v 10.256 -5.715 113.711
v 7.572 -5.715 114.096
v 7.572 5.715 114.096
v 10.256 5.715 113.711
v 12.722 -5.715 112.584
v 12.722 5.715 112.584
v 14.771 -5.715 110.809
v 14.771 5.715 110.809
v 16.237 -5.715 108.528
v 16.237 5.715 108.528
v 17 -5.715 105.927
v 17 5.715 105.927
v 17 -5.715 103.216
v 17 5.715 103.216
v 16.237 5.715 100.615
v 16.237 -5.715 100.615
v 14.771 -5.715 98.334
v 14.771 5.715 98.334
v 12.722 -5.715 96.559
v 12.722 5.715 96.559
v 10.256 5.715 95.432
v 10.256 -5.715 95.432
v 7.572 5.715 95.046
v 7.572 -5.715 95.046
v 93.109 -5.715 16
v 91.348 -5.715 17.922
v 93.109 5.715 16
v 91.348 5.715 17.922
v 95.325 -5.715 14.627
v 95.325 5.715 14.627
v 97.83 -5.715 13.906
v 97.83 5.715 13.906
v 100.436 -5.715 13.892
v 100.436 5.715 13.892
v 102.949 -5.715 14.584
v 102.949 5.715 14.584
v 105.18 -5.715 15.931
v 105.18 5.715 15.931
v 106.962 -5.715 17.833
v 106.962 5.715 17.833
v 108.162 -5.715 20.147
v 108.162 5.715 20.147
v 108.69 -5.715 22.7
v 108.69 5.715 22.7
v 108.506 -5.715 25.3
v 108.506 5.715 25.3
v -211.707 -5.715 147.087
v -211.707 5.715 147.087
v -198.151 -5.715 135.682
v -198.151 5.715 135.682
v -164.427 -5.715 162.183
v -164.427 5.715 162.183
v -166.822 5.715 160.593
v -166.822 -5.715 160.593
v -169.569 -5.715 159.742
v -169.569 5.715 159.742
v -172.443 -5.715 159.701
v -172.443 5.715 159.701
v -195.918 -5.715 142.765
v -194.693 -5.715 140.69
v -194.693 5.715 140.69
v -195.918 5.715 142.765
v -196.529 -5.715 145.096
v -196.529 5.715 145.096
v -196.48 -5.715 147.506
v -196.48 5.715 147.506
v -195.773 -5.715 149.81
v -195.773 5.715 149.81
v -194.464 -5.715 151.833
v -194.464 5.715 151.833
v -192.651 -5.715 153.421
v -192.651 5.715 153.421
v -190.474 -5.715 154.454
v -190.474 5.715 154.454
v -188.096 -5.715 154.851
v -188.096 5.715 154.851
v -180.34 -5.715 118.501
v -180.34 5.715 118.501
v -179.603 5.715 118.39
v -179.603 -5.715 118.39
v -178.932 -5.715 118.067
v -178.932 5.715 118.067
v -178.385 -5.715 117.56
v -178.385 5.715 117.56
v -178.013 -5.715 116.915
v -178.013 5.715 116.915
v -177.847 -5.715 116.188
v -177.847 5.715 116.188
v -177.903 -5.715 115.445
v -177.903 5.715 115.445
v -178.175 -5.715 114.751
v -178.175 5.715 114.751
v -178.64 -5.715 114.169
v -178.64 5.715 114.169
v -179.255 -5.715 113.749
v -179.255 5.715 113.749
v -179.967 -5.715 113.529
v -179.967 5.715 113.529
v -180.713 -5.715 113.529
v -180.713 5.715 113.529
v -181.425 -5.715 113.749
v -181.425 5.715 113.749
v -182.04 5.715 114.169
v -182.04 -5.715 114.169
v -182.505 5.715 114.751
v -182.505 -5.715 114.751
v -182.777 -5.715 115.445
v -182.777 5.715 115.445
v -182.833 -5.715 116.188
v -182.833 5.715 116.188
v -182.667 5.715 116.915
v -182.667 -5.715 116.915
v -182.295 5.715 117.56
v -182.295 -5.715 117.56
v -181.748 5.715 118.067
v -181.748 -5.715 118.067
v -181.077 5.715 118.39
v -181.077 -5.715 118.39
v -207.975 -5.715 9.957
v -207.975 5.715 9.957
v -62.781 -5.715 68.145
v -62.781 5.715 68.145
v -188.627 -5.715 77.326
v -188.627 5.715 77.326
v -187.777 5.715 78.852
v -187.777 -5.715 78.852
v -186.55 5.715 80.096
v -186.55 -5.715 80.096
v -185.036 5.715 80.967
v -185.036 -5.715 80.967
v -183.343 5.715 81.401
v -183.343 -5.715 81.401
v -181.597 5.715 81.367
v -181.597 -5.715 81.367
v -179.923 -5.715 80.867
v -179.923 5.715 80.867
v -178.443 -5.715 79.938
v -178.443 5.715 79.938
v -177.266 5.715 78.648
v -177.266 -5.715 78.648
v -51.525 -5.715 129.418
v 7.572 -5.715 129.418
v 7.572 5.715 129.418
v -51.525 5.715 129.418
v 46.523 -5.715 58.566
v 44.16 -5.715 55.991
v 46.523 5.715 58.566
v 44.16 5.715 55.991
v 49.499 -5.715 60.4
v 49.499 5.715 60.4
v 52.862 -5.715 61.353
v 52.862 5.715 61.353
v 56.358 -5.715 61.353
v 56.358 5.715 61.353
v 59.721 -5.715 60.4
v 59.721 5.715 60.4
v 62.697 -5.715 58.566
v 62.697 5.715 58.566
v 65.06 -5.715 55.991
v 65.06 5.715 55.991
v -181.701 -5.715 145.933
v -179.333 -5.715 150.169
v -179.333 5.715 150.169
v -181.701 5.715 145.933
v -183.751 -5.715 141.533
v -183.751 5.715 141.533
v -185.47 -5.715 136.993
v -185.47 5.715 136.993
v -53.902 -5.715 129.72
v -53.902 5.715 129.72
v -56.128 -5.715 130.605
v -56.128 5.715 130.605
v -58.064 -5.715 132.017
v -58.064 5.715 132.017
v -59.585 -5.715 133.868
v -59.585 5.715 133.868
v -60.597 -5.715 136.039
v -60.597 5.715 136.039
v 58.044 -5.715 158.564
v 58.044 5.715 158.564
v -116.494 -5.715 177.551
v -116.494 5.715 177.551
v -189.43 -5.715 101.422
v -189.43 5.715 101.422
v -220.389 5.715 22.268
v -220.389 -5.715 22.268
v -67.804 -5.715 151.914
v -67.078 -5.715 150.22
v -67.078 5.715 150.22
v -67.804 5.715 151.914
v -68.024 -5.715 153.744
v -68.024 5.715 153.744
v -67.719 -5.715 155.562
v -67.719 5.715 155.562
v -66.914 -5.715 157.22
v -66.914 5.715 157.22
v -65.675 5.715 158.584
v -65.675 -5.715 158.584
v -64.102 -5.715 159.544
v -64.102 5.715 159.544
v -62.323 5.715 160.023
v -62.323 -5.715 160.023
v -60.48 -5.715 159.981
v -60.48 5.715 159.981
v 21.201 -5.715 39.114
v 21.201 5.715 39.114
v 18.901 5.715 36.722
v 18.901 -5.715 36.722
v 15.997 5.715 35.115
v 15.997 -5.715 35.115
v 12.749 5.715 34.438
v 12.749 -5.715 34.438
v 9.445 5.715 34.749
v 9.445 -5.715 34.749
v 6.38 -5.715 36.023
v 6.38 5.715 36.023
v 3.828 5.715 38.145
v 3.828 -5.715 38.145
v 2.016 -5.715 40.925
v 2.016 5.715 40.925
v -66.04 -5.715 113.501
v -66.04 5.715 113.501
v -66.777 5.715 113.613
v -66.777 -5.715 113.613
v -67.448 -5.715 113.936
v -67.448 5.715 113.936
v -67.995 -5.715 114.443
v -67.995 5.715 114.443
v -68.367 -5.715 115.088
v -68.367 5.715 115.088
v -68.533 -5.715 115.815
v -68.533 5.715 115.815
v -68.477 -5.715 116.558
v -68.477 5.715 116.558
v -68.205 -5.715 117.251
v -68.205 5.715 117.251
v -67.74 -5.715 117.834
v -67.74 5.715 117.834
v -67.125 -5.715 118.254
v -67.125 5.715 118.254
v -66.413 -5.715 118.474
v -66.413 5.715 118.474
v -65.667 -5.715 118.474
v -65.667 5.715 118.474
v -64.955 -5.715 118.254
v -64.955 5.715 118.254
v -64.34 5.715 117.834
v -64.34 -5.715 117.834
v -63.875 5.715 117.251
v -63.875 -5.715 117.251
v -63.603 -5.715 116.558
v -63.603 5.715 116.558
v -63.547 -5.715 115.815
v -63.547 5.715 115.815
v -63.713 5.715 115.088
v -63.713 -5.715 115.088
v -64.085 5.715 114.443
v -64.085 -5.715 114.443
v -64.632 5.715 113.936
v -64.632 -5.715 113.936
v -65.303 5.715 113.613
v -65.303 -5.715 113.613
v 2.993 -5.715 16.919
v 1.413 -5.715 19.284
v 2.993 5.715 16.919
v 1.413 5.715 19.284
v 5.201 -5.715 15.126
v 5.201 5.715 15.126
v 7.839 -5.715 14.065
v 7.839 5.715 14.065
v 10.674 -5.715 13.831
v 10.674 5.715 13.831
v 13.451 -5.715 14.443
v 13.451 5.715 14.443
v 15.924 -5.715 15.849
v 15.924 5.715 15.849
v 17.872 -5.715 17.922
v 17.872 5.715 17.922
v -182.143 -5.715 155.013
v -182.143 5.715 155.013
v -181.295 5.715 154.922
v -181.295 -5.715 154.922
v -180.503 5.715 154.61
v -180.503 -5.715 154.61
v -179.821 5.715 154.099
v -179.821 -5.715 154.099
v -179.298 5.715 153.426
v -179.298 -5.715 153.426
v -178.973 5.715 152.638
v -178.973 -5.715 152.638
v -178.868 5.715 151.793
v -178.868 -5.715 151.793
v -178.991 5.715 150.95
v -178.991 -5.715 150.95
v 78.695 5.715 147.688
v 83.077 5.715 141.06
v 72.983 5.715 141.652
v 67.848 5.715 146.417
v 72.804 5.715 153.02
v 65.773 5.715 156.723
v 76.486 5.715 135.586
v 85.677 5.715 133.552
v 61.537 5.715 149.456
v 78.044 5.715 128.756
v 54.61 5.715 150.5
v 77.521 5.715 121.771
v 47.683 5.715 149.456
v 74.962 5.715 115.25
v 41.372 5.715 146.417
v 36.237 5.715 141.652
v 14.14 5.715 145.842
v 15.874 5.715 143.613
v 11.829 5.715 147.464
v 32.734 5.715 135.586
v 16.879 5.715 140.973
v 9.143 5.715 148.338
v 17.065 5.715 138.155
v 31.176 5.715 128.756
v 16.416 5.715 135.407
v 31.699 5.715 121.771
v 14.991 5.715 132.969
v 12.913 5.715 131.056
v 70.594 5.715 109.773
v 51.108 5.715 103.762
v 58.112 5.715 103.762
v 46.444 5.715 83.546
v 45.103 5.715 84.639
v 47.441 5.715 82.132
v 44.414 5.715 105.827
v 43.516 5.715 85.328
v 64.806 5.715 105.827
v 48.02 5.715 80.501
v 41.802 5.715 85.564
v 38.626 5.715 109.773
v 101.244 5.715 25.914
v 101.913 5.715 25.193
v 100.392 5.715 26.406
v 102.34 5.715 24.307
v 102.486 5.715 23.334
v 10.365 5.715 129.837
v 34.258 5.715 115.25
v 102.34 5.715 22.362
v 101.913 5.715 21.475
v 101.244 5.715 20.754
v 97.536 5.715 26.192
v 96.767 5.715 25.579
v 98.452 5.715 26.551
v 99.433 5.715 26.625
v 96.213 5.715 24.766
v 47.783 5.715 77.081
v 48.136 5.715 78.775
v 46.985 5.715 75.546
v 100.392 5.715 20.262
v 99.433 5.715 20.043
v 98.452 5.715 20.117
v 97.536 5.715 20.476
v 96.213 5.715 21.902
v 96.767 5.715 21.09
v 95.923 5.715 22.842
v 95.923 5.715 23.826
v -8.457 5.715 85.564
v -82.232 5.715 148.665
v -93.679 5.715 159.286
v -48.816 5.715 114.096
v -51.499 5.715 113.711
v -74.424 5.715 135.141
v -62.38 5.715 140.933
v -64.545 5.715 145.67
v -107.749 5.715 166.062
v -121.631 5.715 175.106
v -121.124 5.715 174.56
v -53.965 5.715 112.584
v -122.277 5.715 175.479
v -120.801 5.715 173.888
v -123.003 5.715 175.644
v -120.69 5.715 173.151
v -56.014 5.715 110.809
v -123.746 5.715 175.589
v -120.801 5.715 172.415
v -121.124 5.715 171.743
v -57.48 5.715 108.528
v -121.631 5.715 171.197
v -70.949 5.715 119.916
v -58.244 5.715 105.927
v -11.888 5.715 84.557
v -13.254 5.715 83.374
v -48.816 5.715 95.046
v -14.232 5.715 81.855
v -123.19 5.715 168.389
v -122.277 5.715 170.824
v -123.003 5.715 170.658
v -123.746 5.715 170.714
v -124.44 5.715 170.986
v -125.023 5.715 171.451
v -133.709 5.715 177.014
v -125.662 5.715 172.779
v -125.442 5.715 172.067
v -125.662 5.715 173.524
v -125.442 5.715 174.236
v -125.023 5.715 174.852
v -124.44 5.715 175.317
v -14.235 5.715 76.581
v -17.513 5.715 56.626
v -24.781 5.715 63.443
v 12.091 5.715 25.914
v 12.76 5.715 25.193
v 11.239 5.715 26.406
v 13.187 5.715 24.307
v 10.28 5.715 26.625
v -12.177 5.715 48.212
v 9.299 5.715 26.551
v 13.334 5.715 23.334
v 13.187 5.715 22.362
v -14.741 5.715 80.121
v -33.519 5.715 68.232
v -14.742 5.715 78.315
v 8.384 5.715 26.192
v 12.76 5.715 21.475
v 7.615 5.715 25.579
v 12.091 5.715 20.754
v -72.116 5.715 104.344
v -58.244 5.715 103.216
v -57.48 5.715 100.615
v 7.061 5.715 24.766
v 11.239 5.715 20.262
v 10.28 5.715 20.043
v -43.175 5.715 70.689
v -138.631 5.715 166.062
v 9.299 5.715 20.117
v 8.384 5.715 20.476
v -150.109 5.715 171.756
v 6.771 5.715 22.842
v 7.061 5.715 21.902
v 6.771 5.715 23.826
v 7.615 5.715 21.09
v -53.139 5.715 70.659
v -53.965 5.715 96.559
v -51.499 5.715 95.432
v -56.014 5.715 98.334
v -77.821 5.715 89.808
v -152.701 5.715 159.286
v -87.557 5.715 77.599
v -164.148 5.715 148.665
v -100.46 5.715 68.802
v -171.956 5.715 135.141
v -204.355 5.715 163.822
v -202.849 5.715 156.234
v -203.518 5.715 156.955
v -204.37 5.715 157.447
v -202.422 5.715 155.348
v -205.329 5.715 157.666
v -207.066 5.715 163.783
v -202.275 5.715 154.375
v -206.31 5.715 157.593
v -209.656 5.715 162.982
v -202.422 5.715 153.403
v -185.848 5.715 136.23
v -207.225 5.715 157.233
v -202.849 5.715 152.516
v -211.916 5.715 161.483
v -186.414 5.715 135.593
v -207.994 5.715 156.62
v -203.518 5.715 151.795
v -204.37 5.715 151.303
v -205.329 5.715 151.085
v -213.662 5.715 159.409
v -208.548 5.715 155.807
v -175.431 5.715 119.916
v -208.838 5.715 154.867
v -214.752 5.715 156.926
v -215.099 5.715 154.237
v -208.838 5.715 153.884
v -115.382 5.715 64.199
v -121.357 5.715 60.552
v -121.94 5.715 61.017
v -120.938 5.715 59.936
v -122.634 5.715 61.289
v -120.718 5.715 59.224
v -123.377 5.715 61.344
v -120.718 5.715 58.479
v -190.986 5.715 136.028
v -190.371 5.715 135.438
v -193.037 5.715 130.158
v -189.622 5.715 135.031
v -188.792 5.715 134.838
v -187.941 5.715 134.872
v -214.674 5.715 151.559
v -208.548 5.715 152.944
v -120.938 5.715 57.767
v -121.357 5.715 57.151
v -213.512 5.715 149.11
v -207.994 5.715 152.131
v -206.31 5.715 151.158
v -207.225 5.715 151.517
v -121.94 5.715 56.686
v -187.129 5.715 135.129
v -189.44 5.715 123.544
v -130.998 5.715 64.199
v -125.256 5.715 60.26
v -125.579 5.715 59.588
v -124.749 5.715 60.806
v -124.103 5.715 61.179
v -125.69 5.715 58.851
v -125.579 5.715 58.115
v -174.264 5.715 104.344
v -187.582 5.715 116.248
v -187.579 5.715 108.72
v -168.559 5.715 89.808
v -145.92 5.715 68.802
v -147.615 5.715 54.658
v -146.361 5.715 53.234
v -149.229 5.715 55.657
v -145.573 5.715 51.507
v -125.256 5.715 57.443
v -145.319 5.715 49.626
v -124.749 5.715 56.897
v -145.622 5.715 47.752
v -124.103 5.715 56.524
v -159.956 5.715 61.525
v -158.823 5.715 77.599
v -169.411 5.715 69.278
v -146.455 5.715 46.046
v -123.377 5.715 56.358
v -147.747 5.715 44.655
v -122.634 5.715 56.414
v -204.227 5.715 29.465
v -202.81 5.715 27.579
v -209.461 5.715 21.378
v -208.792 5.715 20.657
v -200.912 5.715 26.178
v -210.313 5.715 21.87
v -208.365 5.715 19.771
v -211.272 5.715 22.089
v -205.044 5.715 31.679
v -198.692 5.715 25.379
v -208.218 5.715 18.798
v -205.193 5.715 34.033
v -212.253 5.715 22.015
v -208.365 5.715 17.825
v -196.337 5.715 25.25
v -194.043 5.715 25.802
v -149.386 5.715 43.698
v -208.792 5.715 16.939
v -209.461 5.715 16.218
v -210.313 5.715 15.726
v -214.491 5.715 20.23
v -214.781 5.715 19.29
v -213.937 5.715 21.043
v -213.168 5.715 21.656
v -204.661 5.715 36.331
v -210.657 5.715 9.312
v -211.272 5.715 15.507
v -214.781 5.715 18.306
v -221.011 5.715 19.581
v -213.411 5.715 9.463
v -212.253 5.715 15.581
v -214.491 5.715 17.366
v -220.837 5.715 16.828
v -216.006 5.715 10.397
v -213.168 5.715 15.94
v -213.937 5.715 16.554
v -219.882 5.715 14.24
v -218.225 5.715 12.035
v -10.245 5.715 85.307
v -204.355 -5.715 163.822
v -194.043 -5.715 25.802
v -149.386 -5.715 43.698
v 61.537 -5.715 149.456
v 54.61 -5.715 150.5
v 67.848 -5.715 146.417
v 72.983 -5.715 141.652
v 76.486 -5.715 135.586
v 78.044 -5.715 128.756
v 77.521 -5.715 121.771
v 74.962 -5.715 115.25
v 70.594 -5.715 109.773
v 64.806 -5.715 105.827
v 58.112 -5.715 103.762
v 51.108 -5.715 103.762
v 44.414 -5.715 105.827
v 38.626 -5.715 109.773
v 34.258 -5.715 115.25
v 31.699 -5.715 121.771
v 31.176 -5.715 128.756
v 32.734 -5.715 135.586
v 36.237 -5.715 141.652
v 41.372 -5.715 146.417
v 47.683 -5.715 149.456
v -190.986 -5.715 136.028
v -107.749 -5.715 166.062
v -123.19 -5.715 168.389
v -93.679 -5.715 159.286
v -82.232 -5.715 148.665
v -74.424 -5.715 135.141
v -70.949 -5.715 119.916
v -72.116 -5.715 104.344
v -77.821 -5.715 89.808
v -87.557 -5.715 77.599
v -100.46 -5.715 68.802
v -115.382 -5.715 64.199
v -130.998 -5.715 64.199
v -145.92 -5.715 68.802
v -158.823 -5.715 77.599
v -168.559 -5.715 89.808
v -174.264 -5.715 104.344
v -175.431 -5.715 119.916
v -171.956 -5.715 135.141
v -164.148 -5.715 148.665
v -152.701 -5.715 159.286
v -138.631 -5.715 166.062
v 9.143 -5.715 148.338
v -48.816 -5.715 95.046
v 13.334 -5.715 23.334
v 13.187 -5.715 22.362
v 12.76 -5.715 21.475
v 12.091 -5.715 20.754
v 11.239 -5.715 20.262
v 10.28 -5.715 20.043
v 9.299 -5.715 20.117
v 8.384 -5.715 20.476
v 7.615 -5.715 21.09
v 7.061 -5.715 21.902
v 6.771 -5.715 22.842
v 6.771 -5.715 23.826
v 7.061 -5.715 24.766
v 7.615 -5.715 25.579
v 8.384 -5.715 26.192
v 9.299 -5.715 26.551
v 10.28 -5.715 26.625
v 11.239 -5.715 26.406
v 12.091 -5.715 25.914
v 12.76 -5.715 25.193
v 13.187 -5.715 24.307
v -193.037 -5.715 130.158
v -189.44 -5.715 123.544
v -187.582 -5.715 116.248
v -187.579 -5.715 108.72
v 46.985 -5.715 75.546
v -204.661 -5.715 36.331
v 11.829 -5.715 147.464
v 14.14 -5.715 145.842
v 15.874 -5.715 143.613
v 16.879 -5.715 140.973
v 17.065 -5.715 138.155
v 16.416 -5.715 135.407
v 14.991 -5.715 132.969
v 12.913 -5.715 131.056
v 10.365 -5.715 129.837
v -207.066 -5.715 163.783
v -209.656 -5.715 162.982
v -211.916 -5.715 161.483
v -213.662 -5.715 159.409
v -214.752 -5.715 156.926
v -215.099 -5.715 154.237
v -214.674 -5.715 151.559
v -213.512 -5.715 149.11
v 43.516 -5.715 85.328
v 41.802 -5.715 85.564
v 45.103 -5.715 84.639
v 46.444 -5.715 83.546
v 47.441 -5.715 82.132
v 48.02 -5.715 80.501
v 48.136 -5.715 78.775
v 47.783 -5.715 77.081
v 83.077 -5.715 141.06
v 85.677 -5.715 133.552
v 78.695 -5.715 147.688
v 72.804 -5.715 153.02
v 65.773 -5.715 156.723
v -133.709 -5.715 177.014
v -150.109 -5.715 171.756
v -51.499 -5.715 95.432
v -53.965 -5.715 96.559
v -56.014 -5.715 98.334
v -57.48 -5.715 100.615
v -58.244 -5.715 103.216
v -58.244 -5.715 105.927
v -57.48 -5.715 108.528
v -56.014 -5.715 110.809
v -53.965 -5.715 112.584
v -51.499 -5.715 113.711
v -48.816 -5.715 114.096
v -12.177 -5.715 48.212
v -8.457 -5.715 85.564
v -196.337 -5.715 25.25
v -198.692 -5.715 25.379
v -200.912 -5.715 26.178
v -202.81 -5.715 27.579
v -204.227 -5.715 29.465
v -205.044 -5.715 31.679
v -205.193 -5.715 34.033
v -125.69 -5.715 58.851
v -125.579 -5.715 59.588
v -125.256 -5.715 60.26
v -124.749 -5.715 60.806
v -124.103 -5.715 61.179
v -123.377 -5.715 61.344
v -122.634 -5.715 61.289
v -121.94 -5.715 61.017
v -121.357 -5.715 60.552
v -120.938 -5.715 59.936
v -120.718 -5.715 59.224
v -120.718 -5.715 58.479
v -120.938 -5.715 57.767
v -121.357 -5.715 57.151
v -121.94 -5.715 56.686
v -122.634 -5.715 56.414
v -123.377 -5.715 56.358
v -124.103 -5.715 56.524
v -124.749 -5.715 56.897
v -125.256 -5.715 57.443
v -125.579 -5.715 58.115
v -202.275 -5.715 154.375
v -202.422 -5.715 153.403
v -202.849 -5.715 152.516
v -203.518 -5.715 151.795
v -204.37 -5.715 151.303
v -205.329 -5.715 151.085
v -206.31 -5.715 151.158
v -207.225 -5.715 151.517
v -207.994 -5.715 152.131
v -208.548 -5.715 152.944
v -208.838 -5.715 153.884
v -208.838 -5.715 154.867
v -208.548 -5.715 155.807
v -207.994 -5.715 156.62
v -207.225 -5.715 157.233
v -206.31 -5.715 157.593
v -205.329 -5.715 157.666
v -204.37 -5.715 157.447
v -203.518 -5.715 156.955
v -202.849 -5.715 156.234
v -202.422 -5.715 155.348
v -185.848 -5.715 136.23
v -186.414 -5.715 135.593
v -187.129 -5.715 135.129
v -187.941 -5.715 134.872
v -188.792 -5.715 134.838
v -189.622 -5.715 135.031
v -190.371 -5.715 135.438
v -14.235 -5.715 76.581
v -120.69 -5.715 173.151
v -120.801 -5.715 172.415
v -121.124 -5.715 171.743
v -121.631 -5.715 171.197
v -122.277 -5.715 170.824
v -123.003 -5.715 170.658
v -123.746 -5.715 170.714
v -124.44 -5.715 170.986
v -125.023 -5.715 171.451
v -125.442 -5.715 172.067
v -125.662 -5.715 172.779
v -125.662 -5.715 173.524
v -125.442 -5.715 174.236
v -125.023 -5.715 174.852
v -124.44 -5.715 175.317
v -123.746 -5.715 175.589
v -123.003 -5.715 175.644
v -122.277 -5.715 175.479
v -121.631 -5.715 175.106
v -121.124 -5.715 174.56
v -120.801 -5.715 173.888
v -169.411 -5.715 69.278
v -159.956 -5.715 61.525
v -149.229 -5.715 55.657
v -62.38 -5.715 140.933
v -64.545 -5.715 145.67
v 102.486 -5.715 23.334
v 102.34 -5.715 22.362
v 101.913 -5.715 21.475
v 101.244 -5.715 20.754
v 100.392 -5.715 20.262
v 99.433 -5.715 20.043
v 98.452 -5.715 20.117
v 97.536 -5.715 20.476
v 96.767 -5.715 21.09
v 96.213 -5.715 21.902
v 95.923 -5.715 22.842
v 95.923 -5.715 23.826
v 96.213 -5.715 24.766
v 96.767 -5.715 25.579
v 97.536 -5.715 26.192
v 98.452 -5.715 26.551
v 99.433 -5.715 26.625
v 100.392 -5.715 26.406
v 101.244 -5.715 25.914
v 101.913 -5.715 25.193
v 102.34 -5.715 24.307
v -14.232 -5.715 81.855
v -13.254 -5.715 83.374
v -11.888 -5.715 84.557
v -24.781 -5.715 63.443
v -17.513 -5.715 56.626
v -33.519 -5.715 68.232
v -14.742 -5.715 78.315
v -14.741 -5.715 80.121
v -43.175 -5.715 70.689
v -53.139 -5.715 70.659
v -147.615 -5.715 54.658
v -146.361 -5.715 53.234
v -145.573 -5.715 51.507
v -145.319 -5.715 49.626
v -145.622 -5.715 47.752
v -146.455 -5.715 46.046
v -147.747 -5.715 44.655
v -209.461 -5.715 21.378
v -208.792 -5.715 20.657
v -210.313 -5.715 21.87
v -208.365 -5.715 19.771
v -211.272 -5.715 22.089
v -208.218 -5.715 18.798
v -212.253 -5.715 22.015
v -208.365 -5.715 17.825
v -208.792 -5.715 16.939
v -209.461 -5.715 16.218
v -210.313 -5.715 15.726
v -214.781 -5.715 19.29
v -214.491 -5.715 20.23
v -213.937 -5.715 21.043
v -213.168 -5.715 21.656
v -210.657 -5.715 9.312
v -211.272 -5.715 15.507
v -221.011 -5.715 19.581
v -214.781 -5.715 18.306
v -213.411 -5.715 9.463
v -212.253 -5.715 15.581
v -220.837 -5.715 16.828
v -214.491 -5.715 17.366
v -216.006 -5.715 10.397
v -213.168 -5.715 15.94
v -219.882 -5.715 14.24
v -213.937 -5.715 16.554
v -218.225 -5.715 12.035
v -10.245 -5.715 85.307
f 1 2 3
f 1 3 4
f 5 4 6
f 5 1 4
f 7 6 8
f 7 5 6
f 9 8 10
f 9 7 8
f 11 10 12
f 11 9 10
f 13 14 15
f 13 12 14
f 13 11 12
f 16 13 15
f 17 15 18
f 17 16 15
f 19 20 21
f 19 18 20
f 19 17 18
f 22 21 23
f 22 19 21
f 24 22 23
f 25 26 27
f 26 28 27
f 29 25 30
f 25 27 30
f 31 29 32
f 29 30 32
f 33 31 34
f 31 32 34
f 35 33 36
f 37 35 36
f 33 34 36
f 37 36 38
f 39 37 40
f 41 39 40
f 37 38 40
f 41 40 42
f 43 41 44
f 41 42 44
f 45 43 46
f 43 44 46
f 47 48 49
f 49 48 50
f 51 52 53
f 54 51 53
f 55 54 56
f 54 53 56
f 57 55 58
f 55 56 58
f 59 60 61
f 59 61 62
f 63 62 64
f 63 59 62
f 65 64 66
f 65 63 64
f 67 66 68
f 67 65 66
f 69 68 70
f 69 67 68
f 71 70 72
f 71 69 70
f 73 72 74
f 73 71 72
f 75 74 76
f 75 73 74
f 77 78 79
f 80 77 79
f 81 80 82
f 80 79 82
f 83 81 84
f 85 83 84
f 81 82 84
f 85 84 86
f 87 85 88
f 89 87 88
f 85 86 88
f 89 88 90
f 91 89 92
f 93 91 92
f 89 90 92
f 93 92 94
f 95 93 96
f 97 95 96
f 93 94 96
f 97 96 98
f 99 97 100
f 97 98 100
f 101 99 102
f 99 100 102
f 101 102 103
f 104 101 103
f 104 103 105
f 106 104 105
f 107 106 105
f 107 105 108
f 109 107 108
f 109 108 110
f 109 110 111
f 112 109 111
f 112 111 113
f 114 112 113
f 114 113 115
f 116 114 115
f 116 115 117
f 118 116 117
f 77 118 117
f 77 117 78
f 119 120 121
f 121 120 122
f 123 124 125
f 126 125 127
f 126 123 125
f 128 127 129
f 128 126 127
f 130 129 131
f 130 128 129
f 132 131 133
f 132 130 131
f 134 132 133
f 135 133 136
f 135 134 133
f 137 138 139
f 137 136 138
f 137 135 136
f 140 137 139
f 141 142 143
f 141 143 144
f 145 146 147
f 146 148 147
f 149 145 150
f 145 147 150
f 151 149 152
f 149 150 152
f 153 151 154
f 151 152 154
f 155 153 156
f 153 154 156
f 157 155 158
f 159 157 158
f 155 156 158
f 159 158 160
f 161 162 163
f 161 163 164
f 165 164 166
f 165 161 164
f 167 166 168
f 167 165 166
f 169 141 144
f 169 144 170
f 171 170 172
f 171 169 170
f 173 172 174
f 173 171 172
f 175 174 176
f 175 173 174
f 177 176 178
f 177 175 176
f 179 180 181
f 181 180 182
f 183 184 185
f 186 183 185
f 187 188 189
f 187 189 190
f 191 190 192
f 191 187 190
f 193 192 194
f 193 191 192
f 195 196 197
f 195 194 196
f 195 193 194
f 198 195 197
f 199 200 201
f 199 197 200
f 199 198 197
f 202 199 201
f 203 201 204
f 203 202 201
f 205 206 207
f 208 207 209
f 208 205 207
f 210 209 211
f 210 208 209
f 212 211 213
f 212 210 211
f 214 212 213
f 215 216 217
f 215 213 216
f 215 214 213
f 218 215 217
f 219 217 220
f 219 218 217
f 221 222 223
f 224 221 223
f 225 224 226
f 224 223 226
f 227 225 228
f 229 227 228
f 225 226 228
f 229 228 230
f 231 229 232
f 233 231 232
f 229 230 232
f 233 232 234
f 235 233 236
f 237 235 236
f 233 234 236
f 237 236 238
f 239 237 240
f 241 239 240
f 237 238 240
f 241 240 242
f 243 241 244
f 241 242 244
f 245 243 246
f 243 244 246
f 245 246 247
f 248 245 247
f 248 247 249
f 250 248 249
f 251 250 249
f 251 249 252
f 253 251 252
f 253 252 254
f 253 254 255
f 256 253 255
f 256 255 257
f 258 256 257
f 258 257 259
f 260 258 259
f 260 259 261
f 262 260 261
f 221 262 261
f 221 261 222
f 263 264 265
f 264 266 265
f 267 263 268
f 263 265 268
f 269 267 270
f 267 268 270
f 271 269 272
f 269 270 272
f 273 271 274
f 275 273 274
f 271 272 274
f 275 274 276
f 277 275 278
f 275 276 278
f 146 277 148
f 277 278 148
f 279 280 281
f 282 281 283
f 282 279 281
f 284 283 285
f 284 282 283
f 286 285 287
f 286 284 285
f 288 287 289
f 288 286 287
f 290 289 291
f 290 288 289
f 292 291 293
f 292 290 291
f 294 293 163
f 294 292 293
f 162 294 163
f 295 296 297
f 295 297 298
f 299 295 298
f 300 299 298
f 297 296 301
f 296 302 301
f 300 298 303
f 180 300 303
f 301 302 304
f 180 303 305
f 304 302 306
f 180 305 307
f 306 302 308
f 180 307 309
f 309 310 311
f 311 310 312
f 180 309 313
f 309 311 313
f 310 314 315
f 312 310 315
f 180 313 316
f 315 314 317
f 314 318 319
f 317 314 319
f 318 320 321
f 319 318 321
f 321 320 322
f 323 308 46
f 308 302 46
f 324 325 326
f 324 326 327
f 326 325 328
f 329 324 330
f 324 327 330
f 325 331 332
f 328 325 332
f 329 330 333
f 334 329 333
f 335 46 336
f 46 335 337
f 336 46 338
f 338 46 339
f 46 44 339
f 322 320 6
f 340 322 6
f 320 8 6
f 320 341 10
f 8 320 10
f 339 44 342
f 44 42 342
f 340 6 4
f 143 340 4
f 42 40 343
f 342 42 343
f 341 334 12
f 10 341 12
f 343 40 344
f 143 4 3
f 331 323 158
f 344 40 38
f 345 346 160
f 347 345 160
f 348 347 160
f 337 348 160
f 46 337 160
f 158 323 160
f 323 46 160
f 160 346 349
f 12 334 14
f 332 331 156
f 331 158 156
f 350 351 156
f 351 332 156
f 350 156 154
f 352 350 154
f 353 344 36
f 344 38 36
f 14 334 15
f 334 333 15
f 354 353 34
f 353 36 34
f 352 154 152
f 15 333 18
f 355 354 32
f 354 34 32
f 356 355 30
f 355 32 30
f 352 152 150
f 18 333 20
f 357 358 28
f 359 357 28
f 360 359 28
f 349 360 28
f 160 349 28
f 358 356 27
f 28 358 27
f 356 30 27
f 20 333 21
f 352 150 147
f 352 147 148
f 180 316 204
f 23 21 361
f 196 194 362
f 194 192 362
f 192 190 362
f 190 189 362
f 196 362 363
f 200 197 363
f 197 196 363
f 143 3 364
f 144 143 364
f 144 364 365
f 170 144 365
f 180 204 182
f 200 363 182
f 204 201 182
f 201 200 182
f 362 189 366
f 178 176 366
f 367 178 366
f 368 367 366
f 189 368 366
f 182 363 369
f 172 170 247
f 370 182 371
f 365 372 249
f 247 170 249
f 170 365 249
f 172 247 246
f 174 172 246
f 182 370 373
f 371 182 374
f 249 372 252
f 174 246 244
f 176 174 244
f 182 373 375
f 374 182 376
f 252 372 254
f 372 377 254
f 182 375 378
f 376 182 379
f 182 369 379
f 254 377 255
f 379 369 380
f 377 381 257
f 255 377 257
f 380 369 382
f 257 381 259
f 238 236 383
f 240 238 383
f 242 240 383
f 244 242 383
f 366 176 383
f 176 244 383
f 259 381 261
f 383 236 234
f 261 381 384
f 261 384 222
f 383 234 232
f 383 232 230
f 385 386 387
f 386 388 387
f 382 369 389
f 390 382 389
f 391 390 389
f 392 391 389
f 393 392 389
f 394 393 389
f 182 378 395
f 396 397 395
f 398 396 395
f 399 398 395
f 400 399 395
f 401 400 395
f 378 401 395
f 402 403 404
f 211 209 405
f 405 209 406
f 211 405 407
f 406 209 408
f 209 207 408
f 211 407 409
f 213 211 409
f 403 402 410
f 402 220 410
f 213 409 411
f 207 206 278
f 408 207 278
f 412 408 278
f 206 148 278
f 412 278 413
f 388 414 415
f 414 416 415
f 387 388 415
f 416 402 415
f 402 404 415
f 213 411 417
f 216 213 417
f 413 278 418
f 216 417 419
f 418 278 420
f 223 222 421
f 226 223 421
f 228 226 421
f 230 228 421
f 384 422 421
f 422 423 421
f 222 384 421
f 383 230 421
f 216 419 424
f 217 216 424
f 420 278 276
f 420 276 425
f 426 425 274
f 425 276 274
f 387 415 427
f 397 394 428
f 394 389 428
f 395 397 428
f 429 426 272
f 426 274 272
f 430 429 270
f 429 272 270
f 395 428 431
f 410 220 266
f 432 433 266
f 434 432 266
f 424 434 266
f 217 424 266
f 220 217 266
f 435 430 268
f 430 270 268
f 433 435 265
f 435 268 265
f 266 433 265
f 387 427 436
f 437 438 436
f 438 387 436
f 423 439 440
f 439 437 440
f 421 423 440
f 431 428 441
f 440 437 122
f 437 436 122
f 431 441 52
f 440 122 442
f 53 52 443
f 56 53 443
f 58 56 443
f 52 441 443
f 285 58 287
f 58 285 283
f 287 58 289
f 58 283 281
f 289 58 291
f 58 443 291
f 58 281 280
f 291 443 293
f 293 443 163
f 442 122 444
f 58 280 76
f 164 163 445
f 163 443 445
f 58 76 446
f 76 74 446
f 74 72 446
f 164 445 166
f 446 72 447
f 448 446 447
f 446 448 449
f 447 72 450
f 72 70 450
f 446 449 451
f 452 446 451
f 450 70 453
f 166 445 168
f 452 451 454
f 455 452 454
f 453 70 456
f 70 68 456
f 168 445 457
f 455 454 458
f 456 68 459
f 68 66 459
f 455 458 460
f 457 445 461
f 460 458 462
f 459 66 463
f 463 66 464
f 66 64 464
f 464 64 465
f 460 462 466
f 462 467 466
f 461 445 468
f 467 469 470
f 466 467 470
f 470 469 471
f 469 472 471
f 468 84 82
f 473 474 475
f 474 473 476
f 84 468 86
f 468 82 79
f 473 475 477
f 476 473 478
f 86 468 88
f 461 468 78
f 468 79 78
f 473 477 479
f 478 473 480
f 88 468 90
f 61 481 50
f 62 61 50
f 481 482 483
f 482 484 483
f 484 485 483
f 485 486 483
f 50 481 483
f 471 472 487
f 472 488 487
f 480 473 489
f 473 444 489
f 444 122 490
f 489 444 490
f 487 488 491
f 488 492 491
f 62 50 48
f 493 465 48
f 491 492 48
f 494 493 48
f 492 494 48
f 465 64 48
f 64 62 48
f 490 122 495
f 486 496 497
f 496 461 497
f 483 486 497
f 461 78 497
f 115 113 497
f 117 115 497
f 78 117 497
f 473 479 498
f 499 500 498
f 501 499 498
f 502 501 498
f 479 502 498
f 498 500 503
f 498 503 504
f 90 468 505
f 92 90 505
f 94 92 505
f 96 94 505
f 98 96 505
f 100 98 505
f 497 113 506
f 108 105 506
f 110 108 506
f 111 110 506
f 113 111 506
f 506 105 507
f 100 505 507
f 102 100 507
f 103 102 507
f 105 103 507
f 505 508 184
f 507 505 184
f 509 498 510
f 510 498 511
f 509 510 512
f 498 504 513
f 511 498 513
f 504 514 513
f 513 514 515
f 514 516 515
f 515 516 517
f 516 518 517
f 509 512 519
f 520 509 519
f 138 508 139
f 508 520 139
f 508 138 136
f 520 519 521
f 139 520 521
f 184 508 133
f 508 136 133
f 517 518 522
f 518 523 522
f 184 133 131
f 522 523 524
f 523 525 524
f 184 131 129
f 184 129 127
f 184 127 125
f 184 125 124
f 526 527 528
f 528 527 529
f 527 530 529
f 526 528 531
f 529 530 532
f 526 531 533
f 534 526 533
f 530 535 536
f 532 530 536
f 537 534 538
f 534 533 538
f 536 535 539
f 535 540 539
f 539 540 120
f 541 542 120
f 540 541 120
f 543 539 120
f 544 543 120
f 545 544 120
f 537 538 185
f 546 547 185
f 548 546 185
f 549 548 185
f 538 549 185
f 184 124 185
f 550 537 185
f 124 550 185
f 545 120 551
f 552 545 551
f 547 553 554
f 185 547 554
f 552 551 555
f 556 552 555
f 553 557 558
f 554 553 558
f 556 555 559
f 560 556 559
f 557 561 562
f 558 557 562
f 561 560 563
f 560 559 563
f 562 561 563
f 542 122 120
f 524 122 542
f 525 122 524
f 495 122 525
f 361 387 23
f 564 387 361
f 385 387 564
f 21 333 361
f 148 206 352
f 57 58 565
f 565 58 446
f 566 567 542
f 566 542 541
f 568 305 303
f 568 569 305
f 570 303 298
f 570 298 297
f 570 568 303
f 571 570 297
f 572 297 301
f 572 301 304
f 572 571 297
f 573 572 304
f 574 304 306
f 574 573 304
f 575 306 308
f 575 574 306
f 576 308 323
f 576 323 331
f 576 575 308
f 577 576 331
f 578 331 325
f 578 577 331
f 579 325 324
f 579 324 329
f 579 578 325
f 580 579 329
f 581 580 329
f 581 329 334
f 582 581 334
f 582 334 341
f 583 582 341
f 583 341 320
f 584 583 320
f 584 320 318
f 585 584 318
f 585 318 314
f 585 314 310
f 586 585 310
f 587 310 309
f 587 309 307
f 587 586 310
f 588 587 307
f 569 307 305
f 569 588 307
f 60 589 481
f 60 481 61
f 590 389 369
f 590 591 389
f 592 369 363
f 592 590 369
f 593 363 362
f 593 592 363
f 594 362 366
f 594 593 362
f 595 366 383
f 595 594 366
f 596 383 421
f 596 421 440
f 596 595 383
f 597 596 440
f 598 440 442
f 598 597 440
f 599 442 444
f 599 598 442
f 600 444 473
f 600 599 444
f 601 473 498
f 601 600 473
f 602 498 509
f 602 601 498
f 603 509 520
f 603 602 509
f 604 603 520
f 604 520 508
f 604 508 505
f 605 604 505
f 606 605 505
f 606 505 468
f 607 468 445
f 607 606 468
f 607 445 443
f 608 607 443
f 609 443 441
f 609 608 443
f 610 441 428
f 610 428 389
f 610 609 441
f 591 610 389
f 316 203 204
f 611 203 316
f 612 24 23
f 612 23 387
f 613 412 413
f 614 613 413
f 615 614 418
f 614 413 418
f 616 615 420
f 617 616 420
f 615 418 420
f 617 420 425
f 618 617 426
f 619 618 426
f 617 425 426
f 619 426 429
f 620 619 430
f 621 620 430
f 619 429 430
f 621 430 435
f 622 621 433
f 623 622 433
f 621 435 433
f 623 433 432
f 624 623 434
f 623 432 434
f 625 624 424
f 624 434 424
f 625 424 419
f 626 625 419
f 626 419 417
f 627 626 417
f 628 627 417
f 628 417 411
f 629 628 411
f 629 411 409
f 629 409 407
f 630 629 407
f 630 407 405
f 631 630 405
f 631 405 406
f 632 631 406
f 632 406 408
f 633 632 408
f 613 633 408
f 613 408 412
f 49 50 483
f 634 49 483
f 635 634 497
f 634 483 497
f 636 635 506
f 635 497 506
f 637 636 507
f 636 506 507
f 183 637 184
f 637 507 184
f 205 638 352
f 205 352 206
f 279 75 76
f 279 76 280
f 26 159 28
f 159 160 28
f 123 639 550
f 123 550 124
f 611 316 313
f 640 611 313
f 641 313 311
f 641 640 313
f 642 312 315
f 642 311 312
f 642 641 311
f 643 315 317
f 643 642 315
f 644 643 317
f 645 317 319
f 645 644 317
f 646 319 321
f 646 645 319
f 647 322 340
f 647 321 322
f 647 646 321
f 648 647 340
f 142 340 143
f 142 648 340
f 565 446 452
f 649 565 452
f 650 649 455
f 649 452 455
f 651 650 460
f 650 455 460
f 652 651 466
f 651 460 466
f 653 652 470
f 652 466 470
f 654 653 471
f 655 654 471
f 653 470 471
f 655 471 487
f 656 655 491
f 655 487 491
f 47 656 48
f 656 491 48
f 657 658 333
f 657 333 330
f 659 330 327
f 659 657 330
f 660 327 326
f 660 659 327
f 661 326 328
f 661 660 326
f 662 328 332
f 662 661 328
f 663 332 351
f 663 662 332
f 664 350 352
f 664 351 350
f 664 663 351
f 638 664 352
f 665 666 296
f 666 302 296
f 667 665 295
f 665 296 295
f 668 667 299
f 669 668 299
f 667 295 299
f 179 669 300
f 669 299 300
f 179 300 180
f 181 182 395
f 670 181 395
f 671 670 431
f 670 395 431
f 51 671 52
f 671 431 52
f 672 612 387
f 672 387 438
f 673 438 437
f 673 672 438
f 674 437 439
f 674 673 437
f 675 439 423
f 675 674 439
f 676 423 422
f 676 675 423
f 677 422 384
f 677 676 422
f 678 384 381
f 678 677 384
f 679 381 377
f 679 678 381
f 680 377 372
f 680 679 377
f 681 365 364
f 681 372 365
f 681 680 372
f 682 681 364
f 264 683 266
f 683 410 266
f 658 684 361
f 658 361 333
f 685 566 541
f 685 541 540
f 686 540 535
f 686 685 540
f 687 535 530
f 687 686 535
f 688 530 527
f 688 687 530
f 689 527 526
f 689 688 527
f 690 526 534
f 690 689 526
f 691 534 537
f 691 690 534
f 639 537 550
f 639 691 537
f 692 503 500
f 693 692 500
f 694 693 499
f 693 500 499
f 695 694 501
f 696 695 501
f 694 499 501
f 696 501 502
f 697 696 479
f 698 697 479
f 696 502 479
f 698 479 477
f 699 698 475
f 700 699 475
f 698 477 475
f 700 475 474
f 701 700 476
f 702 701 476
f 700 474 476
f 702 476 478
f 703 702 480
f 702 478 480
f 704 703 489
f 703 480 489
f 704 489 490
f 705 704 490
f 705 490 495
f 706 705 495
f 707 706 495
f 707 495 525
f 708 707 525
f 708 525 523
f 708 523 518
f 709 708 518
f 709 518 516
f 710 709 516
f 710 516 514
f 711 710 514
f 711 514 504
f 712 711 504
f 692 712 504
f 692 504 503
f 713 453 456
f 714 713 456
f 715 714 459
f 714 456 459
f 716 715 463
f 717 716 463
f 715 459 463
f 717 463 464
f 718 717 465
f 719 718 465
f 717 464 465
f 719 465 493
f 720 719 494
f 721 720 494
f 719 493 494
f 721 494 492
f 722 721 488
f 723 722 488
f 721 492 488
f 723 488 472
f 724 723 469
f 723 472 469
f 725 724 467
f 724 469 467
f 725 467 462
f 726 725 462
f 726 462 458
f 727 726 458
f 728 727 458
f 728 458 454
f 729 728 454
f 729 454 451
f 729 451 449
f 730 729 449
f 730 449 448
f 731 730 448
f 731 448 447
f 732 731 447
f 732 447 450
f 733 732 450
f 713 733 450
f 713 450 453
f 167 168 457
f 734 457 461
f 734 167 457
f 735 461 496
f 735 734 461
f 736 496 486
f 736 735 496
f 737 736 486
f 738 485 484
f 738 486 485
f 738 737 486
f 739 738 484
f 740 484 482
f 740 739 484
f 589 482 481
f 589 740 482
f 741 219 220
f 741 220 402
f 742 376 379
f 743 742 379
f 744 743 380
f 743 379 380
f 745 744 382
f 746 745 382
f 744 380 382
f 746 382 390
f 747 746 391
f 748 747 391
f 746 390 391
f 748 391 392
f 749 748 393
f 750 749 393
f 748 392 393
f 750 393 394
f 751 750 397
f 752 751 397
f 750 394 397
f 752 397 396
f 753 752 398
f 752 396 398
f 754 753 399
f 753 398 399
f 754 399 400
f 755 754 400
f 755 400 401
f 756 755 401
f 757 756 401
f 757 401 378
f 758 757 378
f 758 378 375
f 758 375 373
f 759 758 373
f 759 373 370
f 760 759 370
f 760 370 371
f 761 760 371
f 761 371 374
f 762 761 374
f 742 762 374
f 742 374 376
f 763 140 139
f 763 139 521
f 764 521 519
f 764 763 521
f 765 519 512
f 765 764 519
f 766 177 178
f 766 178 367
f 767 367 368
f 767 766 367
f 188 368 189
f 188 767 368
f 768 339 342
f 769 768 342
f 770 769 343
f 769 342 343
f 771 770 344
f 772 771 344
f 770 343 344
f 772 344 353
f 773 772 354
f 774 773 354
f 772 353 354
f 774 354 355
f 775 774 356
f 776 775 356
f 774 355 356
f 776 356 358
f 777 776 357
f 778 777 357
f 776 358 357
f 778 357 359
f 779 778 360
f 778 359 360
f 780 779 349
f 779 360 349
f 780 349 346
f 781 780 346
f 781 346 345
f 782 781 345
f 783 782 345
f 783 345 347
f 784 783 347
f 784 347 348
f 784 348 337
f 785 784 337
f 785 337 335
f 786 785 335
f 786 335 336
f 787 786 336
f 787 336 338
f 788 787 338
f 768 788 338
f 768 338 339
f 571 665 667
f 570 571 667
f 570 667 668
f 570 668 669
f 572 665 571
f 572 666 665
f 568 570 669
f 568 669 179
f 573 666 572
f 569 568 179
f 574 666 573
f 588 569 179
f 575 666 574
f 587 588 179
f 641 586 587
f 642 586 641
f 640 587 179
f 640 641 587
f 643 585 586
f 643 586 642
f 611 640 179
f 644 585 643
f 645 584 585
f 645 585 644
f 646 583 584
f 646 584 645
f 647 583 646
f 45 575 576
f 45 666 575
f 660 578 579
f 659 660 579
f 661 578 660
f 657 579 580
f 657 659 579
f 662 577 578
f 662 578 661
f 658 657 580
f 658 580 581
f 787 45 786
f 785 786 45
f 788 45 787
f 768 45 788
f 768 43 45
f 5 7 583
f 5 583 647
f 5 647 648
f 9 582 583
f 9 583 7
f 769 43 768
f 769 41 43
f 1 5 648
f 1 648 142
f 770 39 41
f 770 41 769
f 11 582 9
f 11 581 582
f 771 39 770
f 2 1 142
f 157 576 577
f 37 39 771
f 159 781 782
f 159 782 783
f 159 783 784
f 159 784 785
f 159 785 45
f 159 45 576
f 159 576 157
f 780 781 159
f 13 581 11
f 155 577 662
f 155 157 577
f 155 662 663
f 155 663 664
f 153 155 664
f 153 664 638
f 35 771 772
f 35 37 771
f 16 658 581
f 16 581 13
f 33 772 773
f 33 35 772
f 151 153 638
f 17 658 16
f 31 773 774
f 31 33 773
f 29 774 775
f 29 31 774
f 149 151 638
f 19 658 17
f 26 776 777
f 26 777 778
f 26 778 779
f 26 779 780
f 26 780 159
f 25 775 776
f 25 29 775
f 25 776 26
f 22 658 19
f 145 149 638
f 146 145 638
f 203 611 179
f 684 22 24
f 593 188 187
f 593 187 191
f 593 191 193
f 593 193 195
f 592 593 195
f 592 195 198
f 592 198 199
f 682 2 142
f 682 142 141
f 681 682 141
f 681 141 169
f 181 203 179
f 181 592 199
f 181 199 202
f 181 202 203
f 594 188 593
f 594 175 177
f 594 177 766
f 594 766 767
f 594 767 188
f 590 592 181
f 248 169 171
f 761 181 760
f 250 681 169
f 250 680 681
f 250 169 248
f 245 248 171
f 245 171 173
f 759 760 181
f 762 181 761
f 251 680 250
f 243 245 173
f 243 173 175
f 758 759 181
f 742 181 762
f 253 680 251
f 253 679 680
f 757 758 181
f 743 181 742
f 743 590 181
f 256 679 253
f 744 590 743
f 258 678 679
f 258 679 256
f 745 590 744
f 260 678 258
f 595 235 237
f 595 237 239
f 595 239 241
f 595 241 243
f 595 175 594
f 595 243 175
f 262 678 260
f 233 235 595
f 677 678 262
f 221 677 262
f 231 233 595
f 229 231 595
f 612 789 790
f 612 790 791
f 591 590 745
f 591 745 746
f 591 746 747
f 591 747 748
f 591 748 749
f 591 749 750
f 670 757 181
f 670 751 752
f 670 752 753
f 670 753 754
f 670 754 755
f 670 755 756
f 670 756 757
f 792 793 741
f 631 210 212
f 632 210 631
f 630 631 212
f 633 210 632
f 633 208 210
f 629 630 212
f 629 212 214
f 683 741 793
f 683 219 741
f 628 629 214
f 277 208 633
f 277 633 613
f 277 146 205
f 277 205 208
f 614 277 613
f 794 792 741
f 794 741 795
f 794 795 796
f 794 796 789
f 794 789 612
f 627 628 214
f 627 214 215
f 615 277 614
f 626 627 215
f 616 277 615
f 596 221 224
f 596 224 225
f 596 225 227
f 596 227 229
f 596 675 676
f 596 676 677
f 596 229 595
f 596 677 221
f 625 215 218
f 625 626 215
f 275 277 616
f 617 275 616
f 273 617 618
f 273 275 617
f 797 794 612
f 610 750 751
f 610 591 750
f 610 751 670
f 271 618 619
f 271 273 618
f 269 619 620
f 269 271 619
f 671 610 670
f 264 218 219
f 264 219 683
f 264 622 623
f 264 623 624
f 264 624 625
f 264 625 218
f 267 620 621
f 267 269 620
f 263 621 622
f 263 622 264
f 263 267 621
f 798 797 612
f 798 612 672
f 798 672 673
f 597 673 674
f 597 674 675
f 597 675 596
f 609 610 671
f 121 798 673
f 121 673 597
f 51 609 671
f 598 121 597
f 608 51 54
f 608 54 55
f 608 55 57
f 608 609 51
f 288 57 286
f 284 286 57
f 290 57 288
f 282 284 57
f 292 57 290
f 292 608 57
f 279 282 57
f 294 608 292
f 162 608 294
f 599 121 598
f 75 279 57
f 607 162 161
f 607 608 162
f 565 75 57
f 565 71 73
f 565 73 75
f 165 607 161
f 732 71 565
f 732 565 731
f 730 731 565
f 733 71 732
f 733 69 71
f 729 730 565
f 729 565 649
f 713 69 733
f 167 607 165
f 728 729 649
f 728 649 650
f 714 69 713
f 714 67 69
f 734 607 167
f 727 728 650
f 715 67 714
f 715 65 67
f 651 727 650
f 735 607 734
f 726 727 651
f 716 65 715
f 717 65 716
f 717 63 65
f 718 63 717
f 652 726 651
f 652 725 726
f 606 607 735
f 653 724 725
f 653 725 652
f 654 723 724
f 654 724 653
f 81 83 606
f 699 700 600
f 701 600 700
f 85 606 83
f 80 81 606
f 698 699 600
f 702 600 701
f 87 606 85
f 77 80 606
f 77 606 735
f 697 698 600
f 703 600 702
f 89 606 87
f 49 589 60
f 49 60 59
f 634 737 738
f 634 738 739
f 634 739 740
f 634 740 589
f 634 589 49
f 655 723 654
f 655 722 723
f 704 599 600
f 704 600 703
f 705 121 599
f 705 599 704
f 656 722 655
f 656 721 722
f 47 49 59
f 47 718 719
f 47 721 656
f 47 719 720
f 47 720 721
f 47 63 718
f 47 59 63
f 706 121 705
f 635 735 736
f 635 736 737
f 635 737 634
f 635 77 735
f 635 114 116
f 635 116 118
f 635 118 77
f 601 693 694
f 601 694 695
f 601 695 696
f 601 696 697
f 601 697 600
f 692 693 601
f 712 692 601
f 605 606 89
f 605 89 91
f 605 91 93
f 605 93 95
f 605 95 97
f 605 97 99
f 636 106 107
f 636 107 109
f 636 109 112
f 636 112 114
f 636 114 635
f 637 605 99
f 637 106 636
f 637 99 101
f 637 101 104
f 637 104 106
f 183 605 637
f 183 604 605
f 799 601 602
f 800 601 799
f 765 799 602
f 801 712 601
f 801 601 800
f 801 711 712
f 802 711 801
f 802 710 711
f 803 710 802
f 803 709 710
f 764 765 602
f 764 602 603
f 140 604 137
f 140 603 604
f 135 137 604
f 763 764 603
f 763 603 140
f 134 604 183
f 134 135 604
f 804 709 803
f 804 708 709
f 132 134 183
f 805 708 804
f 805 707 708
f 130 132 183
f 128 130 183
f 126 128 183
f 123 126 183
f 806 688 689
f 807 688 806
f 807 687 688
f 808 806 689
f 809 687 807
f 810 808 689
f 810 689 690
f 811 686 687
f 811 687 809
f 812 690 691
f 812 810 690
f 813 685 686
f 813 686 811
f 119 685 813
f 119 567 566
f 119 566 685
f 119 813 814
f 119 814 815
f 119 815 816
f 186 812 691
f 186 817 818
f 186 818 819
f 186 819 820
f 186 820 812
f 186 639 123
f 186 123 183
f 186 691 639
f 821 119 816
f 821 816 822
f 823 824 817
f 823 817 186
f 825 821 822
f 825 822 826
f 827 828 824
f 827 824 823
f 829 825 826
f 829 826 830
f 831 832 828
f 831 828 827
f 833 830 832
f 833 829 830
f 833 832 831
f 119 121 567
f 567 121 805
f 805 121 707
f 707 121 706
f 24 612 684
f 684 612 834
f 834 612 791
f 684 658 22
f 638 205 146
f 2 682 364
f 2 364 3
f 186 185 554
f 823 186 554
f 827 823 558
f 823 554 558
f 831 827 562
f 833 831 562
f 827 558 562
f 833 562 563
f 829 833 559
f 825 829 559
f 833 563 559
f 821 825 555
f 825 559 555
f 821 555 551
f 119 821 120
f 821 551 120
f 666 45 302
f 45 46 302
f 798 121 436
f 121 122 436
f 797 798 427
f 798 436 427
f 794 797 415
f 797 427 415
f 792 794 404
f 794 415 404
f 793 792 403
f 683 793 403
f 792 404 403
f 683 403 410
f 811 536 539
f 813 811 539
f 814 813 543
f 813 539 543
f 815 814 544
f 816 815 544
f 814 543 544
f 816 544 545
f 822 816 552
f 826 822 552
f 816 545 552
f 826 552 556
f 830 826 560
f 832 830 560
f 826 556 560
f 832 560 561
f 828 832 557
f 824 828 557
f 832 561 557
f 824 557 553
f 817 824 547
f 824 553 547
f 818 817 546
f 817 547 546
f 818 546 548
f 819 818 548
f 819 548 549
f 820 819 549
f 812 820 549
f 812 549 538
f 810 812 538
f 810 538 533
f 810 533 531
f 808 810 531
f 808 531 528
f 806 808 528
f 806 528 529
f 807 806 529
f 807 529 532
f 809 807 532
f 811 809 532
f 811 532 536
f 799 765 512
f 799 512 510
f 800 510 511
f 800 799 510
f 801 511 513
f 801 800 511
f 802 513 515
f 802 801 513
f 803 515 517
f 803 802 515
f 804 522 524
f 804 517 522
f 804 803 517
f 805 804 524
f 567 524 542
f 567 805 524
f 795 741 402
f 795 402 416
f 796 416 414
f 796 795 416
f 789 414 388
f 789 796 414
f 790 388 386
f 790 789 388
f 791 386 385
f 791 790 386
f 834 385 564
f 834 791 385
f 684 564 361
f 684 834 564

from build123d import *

# Parameters (mm, degrees)
SKETCH1_R             = 52.3875
SKETCH1_R_2           = 23.5
BOSS_EXTRUDE1_DEPTH   = 5.715
M6_CLEARANCE_HOLE1_D  = 6.6
F_5_0MM_DOWEL_HOLE1_D = 5
CIRPATTERN1_COUNT     = 4
CUT_EXTRUDE1_DEPTH    = 284.979078357
CUT_EXTRUDE2_DEPTH    = 284.979078357


with BuildPart() as part:
    # Sketch1 → Boss-Extrude1 (new, symmetric)
    with BuildSketch(Plane(origin=(0, 0, 0), x_dir=(1, 0, 0), z_dir=(0, 1, 0))):
        with BuildLine():
            Line((-207.974881785, -9.956762437), (-62.780706514, -68.14502812))
            ThreePointArc((-62.780706514, -68.14502812), (-33.518744337, -68.231765471), (-12.176603989, -48.212200061))
            Line((-12.176603989, -48.212200061), (1.412558245, -19.284326264))
            ThreePointArc((1.412558245, -19.284326264), (9.247910088, -13.841666007), (17.871565555, -17.92184438))
            Line((17.871565555, -17.92184438), (44.159519082, -55.990558325))
            ThreePointArc((44.159519082, -55.990558325), (54.61, -61.474087679), (65.060480918, -55.990558325))
            Line((65.060480918, -55.990558325), (91.348434445, -17.92184438))
            ThreePointArc((91.348434445, -17.92184438), (102.948934458, -14.583873353), (108.5062916, -25.299722957))
            Line((108.5062916, -25.299722957), (85.67665489, -133.551751975))
            ThreePointArc((85.67665489, -133.551751975), (75.916532775, -150.539204768), (58.043657912, -158.563784522))
            Line((58.043657912, -158.563784522), (-116.494367072, -177.55085719))
            ThreePointArc((-116.494367072, -177.55085719), (-142.092740129, -174.957766874), (-164.426538493, -162.182702446))
            ThreePointArc((-164.426538493, -162.182702446), (-168.164823601, -160.06920649), (-172.443362527, -159.700770109))
            Line((-172.443362527, -159.700770109), (-204.355245166, -163.82191268))
            ThreePointArc((-204.355245166, -163.82191268), (-214.295764489, -158.206433226), (-211.707233022, -147.086764223))
            Line((-211.707233022, -147.086764223), (-198.151371623, -135.681934472))
            ThreePointArc((-198.151371623, -135.681934472), (-188.283833694, -119.954004575), (-189.430137427, -101.422354045))
            Line((-189.430137427, -101.422354045), (-220.388836369, -22.267635732))
            ThreePointArc((-220.388836369, -22.267635732), (-218.225236723, -12.034965467), (-207.974881785, -9.956762437))
        make_face()
        with Locations(Location((-123.19, -116.001477372, 0), (0, 0, 270))):
            Circle(SKETCH1_R, mode=Mode.SUBTRACT)
        with Locations(Location((54.61, -127, 0), (0, 0, 270))):
            Circle(SKETCH1_R_2, mode=Mode.SUBTRACT)
    extrude(amount=BOSS_EXTRUDE1_DEPTH, both=True)

    # M6 Clearance Hole1 (through all)
    with Locations(Plane(origin=(0, -5.715, 0), x_dir=(-1, 0, 0), z_dir=(0, -1, 0))):
        with Locations((-10.033704867, -23.334197365), (211.518182886, -18.798178744), (205.575185514, -154.375359311), (-99.186295133, -23.334197365)):
            Hole(M6_CLEARANCE_HOLE1_D / 2)

    # Ø5.0mm Dowel Hole1 (through all)
    with Locations(Plane(origin=(0, -5.715, 0), x_dir=(-1, 0, 0), z_dir=(0, -1, 0))):
        with Locations((123.19, -173.151477372)):
            f_5_0mm_dowel_hole1 = Hole(F_5_0MM_DOWEL_HOLE1_D / 2)

    # CirPattern1: Ø5.0mm Dowel Hole1 ×4 about axis
    cirpattern1_axis = Axis((-123.19, 0, 116.001477372), (0, 1, 0))
    for i in range(1, CIRPATTERN1_COUNT):
        add(f_5_0mm_dowel_hole1.rotate(cirpattern1_axis, i * 360 / CIRPATTERN1_COUNT), mode=Mode.SUBTRACT)

    # Sketch6 → Cut-Extrude1 (cut, through all)
    with BuildSketch(Plane.XZ.offset(5.715)):
        with BuildLine():
            ThreePointArc((-14.234653979, 76.580666612), (-13.797169823, 82.649279585), (-8.456504121, 85.564197365))
            Line((-8.456504121, 85.564197365), (41.801580719, 85.564197365))
            ThreePointArc((41.801580719, 85.564197365), (47.441443369, 82.132150292), (46.984841737, 75.545913676))
            Line((46.984841737, 75.545913676), (21.201297863, 39.113933708))
            ThreePointArc((21.201297863, 39.113933708), (11.084872861, 34.469497273), (2.016277078, 40.924992231))
            Line((2.016277078, 40.924992231), (-14.234653979, 76.580666612))
        make_face()
        with BuildLine():
            ThreePointArc((-188.626913597, 77.326218823), (-183.343464985, 81.400582198), (-177.265672517, 78.648182362))
            ThreePointArc((-177.265672517, 78.648182362), (-164.864290964, 65.181201114), (-149.229324423, 55.657458697))
            ThreePointArc((-149.229324423, 55.657458697), (-145.319075006, 49.625624375), (-149.386073966, 43.698348841))
            Line((-149.386073966, 43.698348841), (-194.042740287, 25.801666969))
            ThreePointArc((-194.042740287, 25.801666969), (-202.810079512, 27.579196728), (-204.660650751, 36.331409888))
            Line((-204.660650751, 36.331409888), (-188.626913597, 77.326218823))
        make_face()
        with BuildLine():
            ThreePointArc((-194.692687992, 140.689511725), (-195.773357295, 149.809803058), (-188.096484537, 154.850952212))
            Line((-188.096484537, 154.850952212), (-182.142551509, 155.01295786))
            ThreePointArc((-182.142551509, 155.01295786), (-179.298484939, 153.425933155), (-179.332786017, 150.169219243))
            ThreePointArc((-179.332786017, 150.169219243), (-182.766707481, 143.751485155), (-185.46990532, 136.993390091))
            ThreePointArc((-185.46990532, 136.993390091), (-187.940827525, 134.871620657), (-190.985681304, 136.027573744))
            Line((-190.985681304, 136.027573744), (-194.692687992, 140.689511725))
        make_face()
    extrude(amount=-CUT_EXTRUDE1_DEPTH, mode=Mode.SUBTRACT)

    # Sketch7 → Cut-Extrude2 (cut, through all)
    with BuildSketch(Plane.XZ.offset(5.715)):
        with BuildLine():
            Line((-48.815667356, 114.096477372), (7.572332644, 114.096477372))
            ThreePointArc((7.572332644, 114.096477372), (17.097332644, 104.571477372), (7.572332644, 95.046477372))
            Line((7.572332644, 95.046477372), (-48.815667356, 95.046477372))
            ThreePointArc((-48.815667356, 95.046477372), (-58.340667356, 104.571477372), (-48.815667356, 114.096477372))
        make_face()
        with BuildLine():
            Line((-60.480063265, 159.980626251), (9.143311078, 148.338049571))
            ThreePointArc((9.143311078, 148.338049571), (17.064665217, 138.155302762), (7.572332644, 129.418495204))
            Line((7.572332644, 129.418495204), (-51.525154545, 129.418495204))
            ThreePointArc((-51.525154545, 129.418495204), (-57.140513894, 131.249772802), (-60.59665397, 136.039442314))
            ThreePointArc((-60.59665397, 136.039442314), (-63.415414116, 143.322639291), (-67.078188304, 150.220062883))
            ThreePointArc((-67.078188304, 150.220062883), (-66.914295931, 157.219714512), (-60.480063265, 159.980626251))
        make_face()
    extrude(amount=-CUT_EXTRUDE2_DEPTH, mode=Mode.SUBTRACT)


solid = part.part
